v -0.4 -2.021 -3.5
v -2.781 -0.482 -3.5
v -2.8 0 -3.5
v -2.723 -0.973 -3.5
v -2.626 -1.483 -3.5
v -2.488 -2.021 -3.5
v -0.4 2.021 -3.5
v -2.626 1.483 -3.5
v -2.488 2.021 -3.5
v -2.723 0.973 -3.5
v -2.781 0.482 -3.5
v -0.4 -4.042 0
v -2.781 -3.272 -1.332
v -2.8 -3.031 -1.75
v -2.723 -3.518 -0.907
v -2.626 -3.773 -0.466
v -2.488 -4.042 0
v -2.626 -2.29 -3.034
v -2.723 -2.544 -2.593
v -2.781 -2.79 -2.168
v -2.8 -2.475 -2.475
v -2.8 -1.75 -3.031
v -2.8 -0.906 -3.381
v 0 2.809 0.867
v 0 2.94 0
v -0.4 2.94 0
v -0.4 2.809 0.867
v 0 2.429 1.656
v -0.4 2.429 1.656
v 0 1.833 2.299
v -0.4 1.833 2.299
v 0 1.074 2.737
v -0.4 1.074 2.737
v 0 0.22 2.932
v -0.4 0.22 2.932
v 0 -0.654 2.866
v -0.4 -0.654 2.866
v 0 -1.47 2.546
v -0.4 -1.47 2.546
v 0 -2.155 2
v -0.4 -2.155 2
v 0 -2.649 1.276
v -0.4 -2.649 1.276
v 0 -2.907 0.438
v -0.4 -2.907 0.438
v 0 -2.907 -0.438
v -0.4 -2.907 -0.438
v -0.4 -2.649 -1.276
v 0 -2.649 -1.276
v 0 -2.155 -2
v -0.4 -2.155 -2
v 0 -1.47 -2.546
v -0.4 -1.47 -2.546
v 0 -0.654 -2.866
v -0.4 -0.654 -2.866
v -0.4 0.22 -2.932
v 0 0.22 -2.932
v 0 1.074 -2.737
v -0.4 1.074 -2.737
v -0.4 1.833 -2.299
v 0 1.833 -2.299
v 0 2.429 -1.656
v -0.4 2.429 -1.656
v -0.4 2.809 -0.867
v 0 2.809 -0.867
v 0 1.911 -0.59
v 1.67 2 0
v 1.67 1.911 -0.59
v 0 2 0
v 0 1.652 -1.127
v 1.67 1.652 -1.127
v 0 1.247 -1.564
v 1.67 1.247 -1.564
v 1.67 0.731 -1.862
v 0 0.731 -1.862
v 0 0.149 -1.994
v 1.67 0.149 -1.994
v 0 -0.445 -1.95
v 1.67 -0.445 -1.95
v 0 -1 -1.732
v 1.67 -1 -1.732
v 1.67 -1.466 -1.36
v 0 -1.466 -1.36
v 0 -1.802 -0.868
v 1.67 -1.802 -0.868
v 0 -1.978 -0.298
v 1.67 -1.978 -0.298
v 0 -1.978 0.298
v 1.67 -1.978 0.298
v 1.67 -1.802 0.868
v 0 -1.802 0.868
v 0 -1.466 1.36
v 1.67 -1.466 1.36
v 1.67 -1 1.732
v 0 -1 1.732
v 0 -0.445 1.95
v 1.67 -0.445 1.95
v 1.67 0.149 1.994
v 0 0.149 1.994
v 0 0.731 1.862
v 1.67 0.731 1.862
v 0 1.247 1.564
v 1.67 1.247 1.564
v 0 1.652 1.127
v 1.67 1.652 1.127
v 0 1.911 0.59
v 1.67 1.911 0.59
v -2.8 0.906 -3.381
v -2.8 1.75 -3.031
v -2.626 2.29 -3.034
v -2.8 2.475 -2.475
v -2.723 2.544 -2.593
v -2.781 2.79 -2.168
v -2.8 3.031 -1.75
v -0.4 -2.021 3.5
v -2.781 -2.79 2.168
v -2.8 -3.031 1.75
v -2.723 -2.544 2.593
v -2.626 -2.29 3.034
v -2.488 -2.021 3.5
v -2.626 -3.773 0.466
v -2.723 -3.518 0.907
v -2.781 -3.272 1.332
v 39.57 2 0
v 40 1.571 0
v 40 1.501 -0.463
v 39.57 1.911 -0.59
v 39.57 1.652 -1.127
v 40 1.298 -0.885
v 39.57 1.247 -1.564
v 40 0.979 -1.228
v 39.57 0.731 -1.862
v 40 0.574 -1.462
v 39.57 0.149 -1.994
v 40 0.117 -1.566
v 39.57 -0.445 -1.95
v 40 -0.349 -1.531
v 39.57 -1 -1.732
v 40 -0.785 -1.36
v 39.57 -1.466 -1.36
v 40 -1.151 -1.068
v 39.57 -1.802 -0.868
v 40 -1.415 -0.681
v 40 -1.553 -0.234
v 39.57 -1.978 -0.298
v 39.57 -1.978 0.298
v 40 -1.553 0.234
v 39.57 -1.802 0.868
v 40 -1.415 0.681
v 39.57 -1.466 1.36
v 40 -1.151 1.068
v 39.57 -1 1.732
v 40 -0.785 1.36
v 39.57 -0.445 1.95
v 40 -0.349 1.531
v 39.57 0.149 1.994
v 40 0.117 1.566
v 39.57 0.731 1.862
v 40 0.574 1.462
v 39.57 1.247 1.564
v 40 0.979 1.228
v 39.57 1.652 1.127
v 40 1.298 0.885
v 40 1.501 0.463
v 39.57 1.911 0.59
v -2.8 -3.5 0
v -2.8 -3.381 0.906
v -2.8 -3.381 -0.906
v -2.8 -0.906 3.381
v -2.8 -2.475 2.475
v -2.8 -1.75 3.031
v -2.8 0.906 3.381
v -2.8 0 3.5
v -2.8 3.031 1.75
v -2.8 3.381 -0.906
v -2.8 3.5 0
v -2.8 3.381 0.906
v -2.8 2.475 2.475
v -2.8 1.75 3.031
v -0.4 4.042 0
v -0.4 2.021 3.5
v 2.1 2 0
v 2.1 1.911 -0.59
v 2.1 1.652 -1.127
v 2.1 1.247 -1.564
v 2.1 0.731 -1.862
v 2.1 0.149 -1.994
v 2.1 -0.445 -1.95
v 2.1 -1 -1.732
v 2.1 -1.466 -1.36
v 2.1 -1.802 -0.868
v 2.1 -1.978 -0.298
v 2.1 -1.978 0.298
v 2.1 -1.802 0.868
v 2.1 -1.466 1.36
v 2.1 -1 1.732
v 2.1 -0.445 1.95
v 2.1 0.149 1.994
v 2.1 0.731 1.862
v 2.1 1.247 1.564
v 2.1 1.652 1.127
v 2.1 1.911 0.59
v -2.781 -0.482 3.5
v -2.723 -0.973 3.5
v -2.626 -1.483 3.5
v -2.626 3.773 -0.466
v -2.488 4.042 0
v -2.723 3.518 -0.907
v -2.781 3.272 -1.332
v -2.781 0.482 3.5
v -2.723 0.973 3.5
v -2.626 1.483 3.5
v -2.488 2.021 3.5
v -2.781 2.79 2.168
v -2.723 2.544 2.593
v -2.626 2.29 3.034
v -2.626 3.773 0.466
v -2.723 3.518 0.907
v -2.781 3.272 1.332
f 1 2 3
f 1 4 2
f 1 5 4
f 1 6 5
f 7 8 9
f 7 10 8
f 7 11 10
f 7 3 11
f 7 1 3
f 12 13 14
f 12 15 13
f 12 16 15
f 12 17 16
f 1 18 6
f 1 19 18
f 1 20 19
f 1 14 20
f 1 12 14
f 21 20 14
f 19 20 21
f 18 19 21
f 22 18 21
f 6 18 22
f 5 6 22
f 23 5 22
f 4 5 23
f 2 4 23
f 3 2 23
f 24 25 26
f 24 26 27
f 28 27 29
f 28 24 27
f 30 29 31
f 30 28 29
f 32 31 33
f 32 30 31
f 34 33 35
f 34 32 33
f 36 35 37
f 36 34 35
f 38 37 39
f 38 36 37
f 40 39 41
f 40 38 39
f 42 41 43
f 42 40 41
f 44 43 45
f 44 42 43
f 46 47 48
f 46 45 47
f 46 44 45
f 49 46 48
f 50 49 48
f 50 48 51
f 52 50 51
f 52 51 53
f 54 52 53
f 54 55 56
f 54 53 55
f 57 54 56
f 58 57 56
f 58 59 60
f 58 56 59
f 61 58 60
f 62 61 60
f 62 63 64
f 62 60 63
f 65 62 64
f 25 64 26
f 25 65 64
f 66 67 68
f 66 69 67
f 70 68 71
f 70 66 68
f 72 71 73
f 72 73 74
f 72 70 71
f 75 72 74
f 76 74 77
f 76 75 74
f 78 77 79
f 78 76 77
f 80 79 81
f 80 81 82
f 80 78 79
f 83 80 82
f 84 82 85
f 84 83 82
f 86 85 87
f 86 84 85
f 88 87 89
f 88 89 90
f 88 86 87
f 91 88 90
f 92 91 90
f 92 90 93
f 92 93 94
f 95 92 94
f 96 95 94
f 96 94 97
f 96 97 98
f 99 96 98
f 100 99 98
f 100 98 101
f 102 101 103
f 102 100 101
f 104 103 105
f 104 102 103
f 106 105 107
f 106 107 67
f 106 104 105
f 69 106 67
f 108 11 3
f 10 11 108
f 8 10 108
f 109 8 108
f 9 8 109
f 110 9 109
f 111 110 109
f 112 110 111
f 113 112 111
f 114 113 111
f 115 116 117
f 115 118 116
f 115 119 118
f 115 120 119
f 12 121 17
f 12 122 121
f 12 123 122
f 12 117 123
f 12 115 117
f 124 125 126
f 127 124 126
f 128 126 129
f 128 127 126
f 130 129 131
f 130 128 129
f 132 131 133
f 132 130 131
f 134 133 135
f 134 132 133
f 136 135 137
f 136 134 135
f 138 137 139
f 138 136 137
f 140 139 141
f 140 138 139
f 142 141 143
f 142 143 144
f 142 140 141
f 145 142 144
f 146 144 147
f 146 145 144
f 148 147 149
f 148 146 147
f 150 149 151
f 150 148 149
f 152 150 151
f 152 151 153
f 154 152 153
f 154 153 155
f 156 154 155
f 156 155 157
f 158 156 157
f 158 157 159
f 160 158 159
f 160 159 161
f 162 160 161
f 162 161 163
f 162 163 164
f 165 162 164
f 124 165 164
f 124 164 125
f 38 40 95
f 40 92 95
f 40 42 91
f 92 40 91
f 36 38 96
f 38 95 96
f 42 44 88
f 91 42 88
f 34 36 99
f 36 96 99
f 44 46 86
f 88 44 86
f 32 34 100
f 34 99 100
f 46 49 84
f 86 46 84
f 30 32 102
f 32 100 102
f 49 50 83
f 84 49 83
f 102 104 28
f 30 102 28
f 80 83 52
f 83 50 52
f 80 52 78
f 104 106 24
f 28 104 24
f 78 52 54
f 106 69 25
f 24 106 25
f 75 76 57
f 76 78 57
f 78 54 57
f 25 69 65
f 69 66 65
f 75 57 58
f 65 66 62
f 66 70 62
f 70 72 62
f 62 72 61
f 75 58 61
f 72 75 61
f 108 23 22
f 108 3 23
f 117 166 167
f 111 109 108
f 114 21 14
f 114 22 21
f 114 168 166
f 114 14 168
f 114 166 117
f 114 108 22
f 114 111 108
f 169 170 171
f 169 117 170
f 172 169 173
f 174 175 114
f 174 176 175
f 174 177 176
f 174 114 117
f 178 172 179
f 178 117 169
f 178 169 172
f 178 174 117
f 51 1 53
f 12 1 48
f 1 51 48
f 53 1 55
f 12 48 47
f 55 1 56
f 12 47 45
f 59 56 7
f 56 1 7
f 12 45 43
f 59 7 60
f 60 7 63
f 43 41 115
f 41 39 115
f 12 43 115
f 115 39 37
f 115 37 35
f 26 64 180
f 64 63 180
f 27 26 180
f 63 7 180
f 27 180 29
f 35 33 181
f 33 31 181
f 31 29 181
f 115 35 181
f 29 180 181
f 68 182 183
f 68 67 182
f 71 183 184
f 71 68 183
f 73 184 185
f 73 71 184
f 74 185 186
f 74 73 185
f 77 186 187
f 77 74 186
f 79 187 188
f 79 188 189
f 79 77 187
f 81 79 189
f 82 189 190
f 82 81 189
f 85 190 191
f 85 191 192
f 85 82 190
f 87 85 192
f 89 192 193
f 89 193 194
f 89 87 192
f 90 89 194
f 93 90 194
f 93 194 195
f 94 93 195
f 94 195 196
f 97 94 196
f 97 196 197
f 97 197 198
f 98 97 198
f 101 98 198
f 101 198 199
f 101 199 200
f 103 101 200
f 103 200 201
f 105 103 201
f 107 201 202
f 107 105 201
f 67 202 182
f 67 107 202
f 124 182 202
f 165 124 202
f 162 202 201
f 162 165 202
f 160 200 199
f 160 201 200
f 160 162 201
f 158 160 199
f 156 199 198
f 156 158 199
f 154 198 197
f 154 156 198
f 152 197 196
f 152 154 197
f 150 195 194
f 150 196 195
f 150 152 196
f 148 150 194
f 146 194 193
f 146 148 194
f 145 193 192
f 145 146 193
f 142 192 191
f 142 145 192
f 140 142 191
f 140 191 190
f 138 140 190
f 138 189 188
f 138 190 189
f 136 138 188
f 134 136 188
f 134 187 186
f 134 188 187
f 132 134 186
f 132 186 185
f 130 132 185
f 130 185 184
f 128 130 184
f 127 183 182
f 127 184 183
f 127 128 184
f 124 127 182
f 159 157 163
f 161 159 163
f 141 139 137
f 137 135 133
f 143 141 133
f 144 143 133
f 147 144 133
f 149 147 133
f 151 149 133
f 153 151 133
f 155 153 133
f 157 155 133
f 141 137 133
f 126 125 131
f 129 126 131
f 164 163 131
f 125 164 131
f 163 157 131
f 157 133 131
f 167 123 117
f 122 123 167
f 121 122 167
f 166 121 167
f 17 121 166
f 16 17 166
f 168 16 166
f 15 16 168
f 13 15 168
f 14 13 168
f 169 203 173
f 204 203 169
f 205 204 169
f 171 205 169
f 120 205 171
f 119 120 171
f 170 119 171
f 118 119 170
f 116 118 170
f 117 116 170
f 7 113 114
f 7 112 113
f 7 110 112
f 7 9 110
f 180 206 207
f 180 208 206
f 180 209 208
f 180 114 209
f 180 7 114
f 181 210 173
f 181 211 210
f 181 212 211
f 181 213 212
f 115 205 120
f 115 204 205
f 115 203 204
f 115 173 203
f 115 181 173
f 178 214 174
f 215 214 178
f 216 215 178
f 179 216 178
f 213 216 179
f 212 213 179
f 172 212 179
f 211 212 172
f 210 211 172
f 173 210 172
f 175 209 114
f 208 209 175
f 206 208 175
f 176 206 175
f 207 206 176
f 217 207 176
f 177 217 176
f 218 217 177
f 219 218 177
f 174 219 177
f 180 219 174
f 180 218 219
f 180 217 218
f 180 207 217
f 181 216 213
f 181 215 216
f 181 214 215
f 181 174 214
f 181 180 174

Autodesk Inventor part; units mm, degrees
ref_plane "YZ Plane" through (0, 0, 0) normal (1, 0, 0) x (0, 1, 0)
ref_plane "XZ Plane" through (0, 0, 0) normal (0, 1, 0) x (-1, 0, 0)
sketch "Sketch1" plane through (0, 0, 0) normal (0, 0, 1) x (1, 0, 0)
  line L0 (0, 2.94) -> (0, 2)
  line L1 (2.1, 2) -> (40, 2)
  line L2 (40, 2) -> (40, 0)
  line L3 (40, 0) -> (-0.4001, 0)
  line L4 (-8.4801, 0) -> (48.08, 0) projected
  line L5 (-0.4001, 0) -> (-0.4001, 2.94)
  line L6 (-0.4001, 2.94) -> (0, 2.94)
  line L7 (2.1, 2) -> (1.6705, 2)
  line L8 (1.6705, 2) -> (0, 2)
  line L9 (0, -0.588) -> (0, 3.528) projected
  dimension "d0" = 40
  dimension "d1" = 37.9
  dimension "d2" = 4
  dimension "d9" = 0.4001
  dimension "d10" = 5.88
  dimension "d13" = 0.4295
  dimension "d14" = 4
revolve "Body" add sketch "Sketch1" angle 360 about axis through (40, 0, 0) along (-1, 0, 0)
sketch "Sketch2" plane through (-0.4001, 0, 0) normal (-1, 0, 0) x (0, 0, 1)
  line L0 (0, 4.0415) -> (3.5, 2.0207)
  line L1 (3.5, 2.0207) -> (3.5, -2.0207)
  line L2 (3.5, -2.0207) -> (0, -4.0415)
  line L3 (0, -4.0415) -> (-3.5, -2.0207)
  line L4 (-3.5, -2.0207) -> (-3.5, 2.0207)
  line L5 (-3.5, 2.0207) -> (0, 4.0415)
  point P0 (0, 0)
  point P1 (0, 0)
  dimension "d11" = 7
extrude "Head" add sketch "Sketch2" along normal blind 2.4
sketch "Sketch4" plane through (0, 0, 0) normal (0, 0, 1) x (1, 0, 0)
  line L0 (-2.8001, 3.5) -> (-2.8001, 4.0415)
  line L1 (-2.8001, 4.0415) -> (-2.4875, 4.0415)
  line L2 (-2.4875, 4.0415) -> (-2.8001, 3.5)
  line L3 (-3.2801, 0) -> (0.0799, 0) projected
  line L4 (-0.4001, 4.0415) -> (-2.8001, 4.0415) projected
  line L5 (-2.8001, 2.0207) -> (-2.8001, 4.0415) projected
  dimension "d5" = 30
  dimension "d19" = 7
revolve "Chamfer1" cut sketch "Sketch4" angle 360 about axis through (-10, 0, 0) along (1, 0, 0)
thread "Thread" size "M4x0.7" class "6g" standard "ISO Metric profile" length 37.9
chamfer "Chamfer2" distance 0.4294 distance2 0.4295 1 edges at (40, -2, 0) measured on face at (40, -0.499, -0.4421)
ref_plane "Work Plane1" through (1.525, 0, 0) normal (0, 0, 1) x (1, 0, 0)
equation "\"d0\" = NLG"
equation "\"d1\" = GEL"
equation "\"d2\" = GD"
equation "\"d10\" = SD2"
equation "\"d14\" = BDM"
equation "\"d11\" = SW"
equation "\"d3\" = KOH - SD"
equation "\"d5\" = ANG1"
equation "\"d19\" = SW0"
equation "\"d15\" = GEL"
equation "\"d6\" = -0.5 * SPD + 0.5 * GD"
equation "\"NLG\" = 40"
equation "\"GD\" = NND"
equation "\"BDM\" = NND"
equation "\"KOH\" = 2.8"
equation "\"GEL\" = 37.9"
equation "\"SW\" = 7"
equation "\"SW0\" = SW"
equation "\"SPD\" = NND - 1.2269 * PTC"
equation "\"SD2\" = 5.88"
equation "\"SD\" = 0.4"
equation "\"ANG1\" = 30deg"
equation "\"GAL\" = 0.61345 * PTC"
equation "\"GUL\" = 0.61345 * PTC"
equation "\"RR\" = 0.2"
equation "\"GD1\" = THREADDIA - 1.2269 * PTC"
equation "\"THREADDIA\" = 4"
equation "\"SDH\" = SD2"
equation "\"SDHG\" = 2.1"
equation "\"TOA\" = 30deg"
equation "\"PTC\" = 0.7"
equation "\"NND\" = 4"
equation "\"E0\" = 8.085"
properties part number "ISO 4017 - M4 x 40(3)" material "Stainless Steel, 440C"
